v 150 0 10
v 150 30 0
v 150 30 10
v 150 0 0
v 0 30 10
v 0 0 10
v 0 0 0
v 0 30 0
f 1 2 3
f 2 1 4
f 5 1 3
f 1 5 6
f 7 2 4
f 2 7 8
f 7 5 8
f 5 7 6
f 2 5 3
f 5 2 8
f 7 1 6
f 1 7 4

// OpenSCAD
// file: quickthread.scad
function _numSections(numTurns) = 1+numTurns*$fn;

extrusionNudge = 0.001;

function threadPoints(section,radius,numTurns,lead) =
    let (n=len(section),
        m=_numSections(numTurns)
        ) 
        [ for (i=[0:m-1]) for (j=[0:n-1]) 
            let (z=i/$fn*lead,
                angle=(i%$fn)/$fn*360,
                v=section[j])
            [ (radius+v[0])*cos(angle), (radius+v[0])*sin(angle),z+v[1]] ];
        
function mod(m,n) = let(mm = m%n) mm<0 ? n+mm : mm;
        
function extrusionPointIndex(pointsPerSection,sectionNumber,pointInSection) = pointsPerSection*sectionNumber + mod(pointInSection,pointsPerSection);
        
function _extrusionStartFace(pointsPerSection) = 
    [for (i=[0:pointsPerSection-1]) extrusionPointIndex(pointsPerSection,0,i)];
            
function _extrusionEndFace(pointsPerSection, numSections) = 
    [for (i=[pointsPerSection-1:-1:0]) extrusionPointIndex(pointsPerSection,numSections-1,i)];
                
function extrusionTubeFaces(pointsPerSection, numSections) =
            [for (i=[0:numSections-2]) for (j=[0:pointsPerSection-1]) for(tri=[0:1])
                tri==0 ? 
                    [extrusionPointIndex(pointsPerSection,i,j),extrusionPointIndex(pointsPerSection,i+1,j),extrusionPointIndex(pointsPerSection,i,j+1)] :
                    [extrusionPointIndex(pointsPerSection,i,j+1), extrusionPointIndex(pointsPerSection,i+1,j),
            extrusionPointIndex(pointsPerSection,i+1,j+1)]];
                
function extrusionFaces(pointsPerSection, numSections) = concat([_extrusionStartFace(pointsPerSection),_extrusionEndFace(pointsPerSection,numSections)],extrusionTubeFaces(pointsPerSection, numSections));

                    
module rawThread(profile, d=undef, h=10, lead=undef, $fn=72, adjustRadius=false, clip=true, includeCylinder=true) {
    radius = d/2;
    vSize = max([for(v1=profile) for(v2=profile) v2[1]-v1[1]]);
    vMin = min([for(v=profile) v[0]]);
    radiusAdjustment = adjustRadius ? vMin : 0;
    _lead = lead==undef ? vSize : lead;
    profileScale = vSize <= _lead-extrusionNudge ? 1 : (_lead-extrusionNudge)/vSize;
    adjProfile = [for(v=profile) [v[0]-radiusAdjustment,v[1]*profileScale]];
    adjRadius = radius + radiusAdjustment;
    hSize = 1+2*adjRadius + 2*max([for (v=adjProfile) v[0]]);
    numTurns = 2+ceil(h/_lead);
    render(convexity=10)
    union() {
        intersection() {
            if (clip)
                translate([-hSize/2,-hSize/2,0]) cube([hSize,hSize,h]);
            translate([0,0,-_lead]) polyhedron(faces=extrusionFaces(len(adjProfile), _numSections(numTurns)), points=threadPoints(
            adjProfile,adjRadius,numTurns,_lead));
        }
        if (includeCylinder) 
            cylinder(r=adjRadius+extrusionNudge,$fn=$fn,h=h);
    }
}

function inch_to_mm(x) = x * 25.4;

// internal = female
module isoThread(d=undef, dInch=undef, pitch=1, tpi=undef, h=1, hInch=undef, lead=undef, leadInch=undef, angle=30, internal=false, starts=1, $fn=72) {

    P = (tpi==undef) ? pitch : inch_to_mm(1/tpi);

    radius = dInch != undef ? inch_to_mm(dInch)/2 : d/2;    
    height = hInch != undef ? inch_to_mm(hInch) : h;
     
    Dmaj = 2*radius;
    H = P * cos(angle);
    
    _lead = leadInch != undef ? inch_to_mm(leadInch) : lead != undef ? lead : P;
    
    externalExtra=0.03;
    internalExtra=0.057;
    profile = !internal ? 
        [ [-H*externalExtra,(-3/8-externalExtra)*P], 
          [(5/8)*H,-P/16],[(5/8)*H,P/16], 
          [-H*externalExtra,(3/8+externalExtra)*pitch] ] :
        [ [0,-(3/8)*P], 
        [(5/8)*H,-P/16],[(5/8+internalExtra)*H,0],
        [(5/8)*H,P/16],[0,(3/8)*P] ];
    Dmin = Dmaj-2*5*H/8;
    myFN=$fn;
    for (i=[0:starts-1]) {
        rotate([0,0,360/starts*i]) rawThread(profile,d=Dmin,h=height,lead=_lead,$fn=myFN,adjustRadius=true);        
    }
}

/*
//rawThread([[0,0],[1.5,1.5],[0,3]], d=50, h=91, pitch=3);
//rawThread([[0,0],[0,3],[3,3],[3,0]], d=50, h=50, pitch=6, $fn=80);
render(convexity=5)
difference() {
    isoThread(d=50,h=30,pitch=3,angle=40,internal=false,$fn=60);
    translate([0,0,-extrusionNudge]) isoThread(d=42,h=30+2*extrusionNudge,pitch=3,angle=40,internal=true,$fn=60);
}
//rawThread([[0,0],[1,0],[.5,.5],[1,1],[0,1]],r=20,h=10,lead=1.5);
*/
// main file
include <quickthread.scad>

width = 150;
length = 30;
thickness = 10;


difference() 
{

   cube ([width,length,thickness]);

   translate([width * 0.1, length * 0.5, -thickness * 0.25])
   %isoThread(d=14, pitch=1.5, h=thickness * 1.3, internal=false) ;
   // metric_thread (diameter=14, pitch=1.5, length=thickness * 1.3, internal=true);

   translate([width * 0.9, length * 0.5, -thickness * 0.25])
   // metric_thread (diameter=14, pitch=1.5, length=thickness * 1.3, internal=true);
   %isoThread(d=14, pitch=1.5, h=thickness * 1.3 , internal=false) ;

}
